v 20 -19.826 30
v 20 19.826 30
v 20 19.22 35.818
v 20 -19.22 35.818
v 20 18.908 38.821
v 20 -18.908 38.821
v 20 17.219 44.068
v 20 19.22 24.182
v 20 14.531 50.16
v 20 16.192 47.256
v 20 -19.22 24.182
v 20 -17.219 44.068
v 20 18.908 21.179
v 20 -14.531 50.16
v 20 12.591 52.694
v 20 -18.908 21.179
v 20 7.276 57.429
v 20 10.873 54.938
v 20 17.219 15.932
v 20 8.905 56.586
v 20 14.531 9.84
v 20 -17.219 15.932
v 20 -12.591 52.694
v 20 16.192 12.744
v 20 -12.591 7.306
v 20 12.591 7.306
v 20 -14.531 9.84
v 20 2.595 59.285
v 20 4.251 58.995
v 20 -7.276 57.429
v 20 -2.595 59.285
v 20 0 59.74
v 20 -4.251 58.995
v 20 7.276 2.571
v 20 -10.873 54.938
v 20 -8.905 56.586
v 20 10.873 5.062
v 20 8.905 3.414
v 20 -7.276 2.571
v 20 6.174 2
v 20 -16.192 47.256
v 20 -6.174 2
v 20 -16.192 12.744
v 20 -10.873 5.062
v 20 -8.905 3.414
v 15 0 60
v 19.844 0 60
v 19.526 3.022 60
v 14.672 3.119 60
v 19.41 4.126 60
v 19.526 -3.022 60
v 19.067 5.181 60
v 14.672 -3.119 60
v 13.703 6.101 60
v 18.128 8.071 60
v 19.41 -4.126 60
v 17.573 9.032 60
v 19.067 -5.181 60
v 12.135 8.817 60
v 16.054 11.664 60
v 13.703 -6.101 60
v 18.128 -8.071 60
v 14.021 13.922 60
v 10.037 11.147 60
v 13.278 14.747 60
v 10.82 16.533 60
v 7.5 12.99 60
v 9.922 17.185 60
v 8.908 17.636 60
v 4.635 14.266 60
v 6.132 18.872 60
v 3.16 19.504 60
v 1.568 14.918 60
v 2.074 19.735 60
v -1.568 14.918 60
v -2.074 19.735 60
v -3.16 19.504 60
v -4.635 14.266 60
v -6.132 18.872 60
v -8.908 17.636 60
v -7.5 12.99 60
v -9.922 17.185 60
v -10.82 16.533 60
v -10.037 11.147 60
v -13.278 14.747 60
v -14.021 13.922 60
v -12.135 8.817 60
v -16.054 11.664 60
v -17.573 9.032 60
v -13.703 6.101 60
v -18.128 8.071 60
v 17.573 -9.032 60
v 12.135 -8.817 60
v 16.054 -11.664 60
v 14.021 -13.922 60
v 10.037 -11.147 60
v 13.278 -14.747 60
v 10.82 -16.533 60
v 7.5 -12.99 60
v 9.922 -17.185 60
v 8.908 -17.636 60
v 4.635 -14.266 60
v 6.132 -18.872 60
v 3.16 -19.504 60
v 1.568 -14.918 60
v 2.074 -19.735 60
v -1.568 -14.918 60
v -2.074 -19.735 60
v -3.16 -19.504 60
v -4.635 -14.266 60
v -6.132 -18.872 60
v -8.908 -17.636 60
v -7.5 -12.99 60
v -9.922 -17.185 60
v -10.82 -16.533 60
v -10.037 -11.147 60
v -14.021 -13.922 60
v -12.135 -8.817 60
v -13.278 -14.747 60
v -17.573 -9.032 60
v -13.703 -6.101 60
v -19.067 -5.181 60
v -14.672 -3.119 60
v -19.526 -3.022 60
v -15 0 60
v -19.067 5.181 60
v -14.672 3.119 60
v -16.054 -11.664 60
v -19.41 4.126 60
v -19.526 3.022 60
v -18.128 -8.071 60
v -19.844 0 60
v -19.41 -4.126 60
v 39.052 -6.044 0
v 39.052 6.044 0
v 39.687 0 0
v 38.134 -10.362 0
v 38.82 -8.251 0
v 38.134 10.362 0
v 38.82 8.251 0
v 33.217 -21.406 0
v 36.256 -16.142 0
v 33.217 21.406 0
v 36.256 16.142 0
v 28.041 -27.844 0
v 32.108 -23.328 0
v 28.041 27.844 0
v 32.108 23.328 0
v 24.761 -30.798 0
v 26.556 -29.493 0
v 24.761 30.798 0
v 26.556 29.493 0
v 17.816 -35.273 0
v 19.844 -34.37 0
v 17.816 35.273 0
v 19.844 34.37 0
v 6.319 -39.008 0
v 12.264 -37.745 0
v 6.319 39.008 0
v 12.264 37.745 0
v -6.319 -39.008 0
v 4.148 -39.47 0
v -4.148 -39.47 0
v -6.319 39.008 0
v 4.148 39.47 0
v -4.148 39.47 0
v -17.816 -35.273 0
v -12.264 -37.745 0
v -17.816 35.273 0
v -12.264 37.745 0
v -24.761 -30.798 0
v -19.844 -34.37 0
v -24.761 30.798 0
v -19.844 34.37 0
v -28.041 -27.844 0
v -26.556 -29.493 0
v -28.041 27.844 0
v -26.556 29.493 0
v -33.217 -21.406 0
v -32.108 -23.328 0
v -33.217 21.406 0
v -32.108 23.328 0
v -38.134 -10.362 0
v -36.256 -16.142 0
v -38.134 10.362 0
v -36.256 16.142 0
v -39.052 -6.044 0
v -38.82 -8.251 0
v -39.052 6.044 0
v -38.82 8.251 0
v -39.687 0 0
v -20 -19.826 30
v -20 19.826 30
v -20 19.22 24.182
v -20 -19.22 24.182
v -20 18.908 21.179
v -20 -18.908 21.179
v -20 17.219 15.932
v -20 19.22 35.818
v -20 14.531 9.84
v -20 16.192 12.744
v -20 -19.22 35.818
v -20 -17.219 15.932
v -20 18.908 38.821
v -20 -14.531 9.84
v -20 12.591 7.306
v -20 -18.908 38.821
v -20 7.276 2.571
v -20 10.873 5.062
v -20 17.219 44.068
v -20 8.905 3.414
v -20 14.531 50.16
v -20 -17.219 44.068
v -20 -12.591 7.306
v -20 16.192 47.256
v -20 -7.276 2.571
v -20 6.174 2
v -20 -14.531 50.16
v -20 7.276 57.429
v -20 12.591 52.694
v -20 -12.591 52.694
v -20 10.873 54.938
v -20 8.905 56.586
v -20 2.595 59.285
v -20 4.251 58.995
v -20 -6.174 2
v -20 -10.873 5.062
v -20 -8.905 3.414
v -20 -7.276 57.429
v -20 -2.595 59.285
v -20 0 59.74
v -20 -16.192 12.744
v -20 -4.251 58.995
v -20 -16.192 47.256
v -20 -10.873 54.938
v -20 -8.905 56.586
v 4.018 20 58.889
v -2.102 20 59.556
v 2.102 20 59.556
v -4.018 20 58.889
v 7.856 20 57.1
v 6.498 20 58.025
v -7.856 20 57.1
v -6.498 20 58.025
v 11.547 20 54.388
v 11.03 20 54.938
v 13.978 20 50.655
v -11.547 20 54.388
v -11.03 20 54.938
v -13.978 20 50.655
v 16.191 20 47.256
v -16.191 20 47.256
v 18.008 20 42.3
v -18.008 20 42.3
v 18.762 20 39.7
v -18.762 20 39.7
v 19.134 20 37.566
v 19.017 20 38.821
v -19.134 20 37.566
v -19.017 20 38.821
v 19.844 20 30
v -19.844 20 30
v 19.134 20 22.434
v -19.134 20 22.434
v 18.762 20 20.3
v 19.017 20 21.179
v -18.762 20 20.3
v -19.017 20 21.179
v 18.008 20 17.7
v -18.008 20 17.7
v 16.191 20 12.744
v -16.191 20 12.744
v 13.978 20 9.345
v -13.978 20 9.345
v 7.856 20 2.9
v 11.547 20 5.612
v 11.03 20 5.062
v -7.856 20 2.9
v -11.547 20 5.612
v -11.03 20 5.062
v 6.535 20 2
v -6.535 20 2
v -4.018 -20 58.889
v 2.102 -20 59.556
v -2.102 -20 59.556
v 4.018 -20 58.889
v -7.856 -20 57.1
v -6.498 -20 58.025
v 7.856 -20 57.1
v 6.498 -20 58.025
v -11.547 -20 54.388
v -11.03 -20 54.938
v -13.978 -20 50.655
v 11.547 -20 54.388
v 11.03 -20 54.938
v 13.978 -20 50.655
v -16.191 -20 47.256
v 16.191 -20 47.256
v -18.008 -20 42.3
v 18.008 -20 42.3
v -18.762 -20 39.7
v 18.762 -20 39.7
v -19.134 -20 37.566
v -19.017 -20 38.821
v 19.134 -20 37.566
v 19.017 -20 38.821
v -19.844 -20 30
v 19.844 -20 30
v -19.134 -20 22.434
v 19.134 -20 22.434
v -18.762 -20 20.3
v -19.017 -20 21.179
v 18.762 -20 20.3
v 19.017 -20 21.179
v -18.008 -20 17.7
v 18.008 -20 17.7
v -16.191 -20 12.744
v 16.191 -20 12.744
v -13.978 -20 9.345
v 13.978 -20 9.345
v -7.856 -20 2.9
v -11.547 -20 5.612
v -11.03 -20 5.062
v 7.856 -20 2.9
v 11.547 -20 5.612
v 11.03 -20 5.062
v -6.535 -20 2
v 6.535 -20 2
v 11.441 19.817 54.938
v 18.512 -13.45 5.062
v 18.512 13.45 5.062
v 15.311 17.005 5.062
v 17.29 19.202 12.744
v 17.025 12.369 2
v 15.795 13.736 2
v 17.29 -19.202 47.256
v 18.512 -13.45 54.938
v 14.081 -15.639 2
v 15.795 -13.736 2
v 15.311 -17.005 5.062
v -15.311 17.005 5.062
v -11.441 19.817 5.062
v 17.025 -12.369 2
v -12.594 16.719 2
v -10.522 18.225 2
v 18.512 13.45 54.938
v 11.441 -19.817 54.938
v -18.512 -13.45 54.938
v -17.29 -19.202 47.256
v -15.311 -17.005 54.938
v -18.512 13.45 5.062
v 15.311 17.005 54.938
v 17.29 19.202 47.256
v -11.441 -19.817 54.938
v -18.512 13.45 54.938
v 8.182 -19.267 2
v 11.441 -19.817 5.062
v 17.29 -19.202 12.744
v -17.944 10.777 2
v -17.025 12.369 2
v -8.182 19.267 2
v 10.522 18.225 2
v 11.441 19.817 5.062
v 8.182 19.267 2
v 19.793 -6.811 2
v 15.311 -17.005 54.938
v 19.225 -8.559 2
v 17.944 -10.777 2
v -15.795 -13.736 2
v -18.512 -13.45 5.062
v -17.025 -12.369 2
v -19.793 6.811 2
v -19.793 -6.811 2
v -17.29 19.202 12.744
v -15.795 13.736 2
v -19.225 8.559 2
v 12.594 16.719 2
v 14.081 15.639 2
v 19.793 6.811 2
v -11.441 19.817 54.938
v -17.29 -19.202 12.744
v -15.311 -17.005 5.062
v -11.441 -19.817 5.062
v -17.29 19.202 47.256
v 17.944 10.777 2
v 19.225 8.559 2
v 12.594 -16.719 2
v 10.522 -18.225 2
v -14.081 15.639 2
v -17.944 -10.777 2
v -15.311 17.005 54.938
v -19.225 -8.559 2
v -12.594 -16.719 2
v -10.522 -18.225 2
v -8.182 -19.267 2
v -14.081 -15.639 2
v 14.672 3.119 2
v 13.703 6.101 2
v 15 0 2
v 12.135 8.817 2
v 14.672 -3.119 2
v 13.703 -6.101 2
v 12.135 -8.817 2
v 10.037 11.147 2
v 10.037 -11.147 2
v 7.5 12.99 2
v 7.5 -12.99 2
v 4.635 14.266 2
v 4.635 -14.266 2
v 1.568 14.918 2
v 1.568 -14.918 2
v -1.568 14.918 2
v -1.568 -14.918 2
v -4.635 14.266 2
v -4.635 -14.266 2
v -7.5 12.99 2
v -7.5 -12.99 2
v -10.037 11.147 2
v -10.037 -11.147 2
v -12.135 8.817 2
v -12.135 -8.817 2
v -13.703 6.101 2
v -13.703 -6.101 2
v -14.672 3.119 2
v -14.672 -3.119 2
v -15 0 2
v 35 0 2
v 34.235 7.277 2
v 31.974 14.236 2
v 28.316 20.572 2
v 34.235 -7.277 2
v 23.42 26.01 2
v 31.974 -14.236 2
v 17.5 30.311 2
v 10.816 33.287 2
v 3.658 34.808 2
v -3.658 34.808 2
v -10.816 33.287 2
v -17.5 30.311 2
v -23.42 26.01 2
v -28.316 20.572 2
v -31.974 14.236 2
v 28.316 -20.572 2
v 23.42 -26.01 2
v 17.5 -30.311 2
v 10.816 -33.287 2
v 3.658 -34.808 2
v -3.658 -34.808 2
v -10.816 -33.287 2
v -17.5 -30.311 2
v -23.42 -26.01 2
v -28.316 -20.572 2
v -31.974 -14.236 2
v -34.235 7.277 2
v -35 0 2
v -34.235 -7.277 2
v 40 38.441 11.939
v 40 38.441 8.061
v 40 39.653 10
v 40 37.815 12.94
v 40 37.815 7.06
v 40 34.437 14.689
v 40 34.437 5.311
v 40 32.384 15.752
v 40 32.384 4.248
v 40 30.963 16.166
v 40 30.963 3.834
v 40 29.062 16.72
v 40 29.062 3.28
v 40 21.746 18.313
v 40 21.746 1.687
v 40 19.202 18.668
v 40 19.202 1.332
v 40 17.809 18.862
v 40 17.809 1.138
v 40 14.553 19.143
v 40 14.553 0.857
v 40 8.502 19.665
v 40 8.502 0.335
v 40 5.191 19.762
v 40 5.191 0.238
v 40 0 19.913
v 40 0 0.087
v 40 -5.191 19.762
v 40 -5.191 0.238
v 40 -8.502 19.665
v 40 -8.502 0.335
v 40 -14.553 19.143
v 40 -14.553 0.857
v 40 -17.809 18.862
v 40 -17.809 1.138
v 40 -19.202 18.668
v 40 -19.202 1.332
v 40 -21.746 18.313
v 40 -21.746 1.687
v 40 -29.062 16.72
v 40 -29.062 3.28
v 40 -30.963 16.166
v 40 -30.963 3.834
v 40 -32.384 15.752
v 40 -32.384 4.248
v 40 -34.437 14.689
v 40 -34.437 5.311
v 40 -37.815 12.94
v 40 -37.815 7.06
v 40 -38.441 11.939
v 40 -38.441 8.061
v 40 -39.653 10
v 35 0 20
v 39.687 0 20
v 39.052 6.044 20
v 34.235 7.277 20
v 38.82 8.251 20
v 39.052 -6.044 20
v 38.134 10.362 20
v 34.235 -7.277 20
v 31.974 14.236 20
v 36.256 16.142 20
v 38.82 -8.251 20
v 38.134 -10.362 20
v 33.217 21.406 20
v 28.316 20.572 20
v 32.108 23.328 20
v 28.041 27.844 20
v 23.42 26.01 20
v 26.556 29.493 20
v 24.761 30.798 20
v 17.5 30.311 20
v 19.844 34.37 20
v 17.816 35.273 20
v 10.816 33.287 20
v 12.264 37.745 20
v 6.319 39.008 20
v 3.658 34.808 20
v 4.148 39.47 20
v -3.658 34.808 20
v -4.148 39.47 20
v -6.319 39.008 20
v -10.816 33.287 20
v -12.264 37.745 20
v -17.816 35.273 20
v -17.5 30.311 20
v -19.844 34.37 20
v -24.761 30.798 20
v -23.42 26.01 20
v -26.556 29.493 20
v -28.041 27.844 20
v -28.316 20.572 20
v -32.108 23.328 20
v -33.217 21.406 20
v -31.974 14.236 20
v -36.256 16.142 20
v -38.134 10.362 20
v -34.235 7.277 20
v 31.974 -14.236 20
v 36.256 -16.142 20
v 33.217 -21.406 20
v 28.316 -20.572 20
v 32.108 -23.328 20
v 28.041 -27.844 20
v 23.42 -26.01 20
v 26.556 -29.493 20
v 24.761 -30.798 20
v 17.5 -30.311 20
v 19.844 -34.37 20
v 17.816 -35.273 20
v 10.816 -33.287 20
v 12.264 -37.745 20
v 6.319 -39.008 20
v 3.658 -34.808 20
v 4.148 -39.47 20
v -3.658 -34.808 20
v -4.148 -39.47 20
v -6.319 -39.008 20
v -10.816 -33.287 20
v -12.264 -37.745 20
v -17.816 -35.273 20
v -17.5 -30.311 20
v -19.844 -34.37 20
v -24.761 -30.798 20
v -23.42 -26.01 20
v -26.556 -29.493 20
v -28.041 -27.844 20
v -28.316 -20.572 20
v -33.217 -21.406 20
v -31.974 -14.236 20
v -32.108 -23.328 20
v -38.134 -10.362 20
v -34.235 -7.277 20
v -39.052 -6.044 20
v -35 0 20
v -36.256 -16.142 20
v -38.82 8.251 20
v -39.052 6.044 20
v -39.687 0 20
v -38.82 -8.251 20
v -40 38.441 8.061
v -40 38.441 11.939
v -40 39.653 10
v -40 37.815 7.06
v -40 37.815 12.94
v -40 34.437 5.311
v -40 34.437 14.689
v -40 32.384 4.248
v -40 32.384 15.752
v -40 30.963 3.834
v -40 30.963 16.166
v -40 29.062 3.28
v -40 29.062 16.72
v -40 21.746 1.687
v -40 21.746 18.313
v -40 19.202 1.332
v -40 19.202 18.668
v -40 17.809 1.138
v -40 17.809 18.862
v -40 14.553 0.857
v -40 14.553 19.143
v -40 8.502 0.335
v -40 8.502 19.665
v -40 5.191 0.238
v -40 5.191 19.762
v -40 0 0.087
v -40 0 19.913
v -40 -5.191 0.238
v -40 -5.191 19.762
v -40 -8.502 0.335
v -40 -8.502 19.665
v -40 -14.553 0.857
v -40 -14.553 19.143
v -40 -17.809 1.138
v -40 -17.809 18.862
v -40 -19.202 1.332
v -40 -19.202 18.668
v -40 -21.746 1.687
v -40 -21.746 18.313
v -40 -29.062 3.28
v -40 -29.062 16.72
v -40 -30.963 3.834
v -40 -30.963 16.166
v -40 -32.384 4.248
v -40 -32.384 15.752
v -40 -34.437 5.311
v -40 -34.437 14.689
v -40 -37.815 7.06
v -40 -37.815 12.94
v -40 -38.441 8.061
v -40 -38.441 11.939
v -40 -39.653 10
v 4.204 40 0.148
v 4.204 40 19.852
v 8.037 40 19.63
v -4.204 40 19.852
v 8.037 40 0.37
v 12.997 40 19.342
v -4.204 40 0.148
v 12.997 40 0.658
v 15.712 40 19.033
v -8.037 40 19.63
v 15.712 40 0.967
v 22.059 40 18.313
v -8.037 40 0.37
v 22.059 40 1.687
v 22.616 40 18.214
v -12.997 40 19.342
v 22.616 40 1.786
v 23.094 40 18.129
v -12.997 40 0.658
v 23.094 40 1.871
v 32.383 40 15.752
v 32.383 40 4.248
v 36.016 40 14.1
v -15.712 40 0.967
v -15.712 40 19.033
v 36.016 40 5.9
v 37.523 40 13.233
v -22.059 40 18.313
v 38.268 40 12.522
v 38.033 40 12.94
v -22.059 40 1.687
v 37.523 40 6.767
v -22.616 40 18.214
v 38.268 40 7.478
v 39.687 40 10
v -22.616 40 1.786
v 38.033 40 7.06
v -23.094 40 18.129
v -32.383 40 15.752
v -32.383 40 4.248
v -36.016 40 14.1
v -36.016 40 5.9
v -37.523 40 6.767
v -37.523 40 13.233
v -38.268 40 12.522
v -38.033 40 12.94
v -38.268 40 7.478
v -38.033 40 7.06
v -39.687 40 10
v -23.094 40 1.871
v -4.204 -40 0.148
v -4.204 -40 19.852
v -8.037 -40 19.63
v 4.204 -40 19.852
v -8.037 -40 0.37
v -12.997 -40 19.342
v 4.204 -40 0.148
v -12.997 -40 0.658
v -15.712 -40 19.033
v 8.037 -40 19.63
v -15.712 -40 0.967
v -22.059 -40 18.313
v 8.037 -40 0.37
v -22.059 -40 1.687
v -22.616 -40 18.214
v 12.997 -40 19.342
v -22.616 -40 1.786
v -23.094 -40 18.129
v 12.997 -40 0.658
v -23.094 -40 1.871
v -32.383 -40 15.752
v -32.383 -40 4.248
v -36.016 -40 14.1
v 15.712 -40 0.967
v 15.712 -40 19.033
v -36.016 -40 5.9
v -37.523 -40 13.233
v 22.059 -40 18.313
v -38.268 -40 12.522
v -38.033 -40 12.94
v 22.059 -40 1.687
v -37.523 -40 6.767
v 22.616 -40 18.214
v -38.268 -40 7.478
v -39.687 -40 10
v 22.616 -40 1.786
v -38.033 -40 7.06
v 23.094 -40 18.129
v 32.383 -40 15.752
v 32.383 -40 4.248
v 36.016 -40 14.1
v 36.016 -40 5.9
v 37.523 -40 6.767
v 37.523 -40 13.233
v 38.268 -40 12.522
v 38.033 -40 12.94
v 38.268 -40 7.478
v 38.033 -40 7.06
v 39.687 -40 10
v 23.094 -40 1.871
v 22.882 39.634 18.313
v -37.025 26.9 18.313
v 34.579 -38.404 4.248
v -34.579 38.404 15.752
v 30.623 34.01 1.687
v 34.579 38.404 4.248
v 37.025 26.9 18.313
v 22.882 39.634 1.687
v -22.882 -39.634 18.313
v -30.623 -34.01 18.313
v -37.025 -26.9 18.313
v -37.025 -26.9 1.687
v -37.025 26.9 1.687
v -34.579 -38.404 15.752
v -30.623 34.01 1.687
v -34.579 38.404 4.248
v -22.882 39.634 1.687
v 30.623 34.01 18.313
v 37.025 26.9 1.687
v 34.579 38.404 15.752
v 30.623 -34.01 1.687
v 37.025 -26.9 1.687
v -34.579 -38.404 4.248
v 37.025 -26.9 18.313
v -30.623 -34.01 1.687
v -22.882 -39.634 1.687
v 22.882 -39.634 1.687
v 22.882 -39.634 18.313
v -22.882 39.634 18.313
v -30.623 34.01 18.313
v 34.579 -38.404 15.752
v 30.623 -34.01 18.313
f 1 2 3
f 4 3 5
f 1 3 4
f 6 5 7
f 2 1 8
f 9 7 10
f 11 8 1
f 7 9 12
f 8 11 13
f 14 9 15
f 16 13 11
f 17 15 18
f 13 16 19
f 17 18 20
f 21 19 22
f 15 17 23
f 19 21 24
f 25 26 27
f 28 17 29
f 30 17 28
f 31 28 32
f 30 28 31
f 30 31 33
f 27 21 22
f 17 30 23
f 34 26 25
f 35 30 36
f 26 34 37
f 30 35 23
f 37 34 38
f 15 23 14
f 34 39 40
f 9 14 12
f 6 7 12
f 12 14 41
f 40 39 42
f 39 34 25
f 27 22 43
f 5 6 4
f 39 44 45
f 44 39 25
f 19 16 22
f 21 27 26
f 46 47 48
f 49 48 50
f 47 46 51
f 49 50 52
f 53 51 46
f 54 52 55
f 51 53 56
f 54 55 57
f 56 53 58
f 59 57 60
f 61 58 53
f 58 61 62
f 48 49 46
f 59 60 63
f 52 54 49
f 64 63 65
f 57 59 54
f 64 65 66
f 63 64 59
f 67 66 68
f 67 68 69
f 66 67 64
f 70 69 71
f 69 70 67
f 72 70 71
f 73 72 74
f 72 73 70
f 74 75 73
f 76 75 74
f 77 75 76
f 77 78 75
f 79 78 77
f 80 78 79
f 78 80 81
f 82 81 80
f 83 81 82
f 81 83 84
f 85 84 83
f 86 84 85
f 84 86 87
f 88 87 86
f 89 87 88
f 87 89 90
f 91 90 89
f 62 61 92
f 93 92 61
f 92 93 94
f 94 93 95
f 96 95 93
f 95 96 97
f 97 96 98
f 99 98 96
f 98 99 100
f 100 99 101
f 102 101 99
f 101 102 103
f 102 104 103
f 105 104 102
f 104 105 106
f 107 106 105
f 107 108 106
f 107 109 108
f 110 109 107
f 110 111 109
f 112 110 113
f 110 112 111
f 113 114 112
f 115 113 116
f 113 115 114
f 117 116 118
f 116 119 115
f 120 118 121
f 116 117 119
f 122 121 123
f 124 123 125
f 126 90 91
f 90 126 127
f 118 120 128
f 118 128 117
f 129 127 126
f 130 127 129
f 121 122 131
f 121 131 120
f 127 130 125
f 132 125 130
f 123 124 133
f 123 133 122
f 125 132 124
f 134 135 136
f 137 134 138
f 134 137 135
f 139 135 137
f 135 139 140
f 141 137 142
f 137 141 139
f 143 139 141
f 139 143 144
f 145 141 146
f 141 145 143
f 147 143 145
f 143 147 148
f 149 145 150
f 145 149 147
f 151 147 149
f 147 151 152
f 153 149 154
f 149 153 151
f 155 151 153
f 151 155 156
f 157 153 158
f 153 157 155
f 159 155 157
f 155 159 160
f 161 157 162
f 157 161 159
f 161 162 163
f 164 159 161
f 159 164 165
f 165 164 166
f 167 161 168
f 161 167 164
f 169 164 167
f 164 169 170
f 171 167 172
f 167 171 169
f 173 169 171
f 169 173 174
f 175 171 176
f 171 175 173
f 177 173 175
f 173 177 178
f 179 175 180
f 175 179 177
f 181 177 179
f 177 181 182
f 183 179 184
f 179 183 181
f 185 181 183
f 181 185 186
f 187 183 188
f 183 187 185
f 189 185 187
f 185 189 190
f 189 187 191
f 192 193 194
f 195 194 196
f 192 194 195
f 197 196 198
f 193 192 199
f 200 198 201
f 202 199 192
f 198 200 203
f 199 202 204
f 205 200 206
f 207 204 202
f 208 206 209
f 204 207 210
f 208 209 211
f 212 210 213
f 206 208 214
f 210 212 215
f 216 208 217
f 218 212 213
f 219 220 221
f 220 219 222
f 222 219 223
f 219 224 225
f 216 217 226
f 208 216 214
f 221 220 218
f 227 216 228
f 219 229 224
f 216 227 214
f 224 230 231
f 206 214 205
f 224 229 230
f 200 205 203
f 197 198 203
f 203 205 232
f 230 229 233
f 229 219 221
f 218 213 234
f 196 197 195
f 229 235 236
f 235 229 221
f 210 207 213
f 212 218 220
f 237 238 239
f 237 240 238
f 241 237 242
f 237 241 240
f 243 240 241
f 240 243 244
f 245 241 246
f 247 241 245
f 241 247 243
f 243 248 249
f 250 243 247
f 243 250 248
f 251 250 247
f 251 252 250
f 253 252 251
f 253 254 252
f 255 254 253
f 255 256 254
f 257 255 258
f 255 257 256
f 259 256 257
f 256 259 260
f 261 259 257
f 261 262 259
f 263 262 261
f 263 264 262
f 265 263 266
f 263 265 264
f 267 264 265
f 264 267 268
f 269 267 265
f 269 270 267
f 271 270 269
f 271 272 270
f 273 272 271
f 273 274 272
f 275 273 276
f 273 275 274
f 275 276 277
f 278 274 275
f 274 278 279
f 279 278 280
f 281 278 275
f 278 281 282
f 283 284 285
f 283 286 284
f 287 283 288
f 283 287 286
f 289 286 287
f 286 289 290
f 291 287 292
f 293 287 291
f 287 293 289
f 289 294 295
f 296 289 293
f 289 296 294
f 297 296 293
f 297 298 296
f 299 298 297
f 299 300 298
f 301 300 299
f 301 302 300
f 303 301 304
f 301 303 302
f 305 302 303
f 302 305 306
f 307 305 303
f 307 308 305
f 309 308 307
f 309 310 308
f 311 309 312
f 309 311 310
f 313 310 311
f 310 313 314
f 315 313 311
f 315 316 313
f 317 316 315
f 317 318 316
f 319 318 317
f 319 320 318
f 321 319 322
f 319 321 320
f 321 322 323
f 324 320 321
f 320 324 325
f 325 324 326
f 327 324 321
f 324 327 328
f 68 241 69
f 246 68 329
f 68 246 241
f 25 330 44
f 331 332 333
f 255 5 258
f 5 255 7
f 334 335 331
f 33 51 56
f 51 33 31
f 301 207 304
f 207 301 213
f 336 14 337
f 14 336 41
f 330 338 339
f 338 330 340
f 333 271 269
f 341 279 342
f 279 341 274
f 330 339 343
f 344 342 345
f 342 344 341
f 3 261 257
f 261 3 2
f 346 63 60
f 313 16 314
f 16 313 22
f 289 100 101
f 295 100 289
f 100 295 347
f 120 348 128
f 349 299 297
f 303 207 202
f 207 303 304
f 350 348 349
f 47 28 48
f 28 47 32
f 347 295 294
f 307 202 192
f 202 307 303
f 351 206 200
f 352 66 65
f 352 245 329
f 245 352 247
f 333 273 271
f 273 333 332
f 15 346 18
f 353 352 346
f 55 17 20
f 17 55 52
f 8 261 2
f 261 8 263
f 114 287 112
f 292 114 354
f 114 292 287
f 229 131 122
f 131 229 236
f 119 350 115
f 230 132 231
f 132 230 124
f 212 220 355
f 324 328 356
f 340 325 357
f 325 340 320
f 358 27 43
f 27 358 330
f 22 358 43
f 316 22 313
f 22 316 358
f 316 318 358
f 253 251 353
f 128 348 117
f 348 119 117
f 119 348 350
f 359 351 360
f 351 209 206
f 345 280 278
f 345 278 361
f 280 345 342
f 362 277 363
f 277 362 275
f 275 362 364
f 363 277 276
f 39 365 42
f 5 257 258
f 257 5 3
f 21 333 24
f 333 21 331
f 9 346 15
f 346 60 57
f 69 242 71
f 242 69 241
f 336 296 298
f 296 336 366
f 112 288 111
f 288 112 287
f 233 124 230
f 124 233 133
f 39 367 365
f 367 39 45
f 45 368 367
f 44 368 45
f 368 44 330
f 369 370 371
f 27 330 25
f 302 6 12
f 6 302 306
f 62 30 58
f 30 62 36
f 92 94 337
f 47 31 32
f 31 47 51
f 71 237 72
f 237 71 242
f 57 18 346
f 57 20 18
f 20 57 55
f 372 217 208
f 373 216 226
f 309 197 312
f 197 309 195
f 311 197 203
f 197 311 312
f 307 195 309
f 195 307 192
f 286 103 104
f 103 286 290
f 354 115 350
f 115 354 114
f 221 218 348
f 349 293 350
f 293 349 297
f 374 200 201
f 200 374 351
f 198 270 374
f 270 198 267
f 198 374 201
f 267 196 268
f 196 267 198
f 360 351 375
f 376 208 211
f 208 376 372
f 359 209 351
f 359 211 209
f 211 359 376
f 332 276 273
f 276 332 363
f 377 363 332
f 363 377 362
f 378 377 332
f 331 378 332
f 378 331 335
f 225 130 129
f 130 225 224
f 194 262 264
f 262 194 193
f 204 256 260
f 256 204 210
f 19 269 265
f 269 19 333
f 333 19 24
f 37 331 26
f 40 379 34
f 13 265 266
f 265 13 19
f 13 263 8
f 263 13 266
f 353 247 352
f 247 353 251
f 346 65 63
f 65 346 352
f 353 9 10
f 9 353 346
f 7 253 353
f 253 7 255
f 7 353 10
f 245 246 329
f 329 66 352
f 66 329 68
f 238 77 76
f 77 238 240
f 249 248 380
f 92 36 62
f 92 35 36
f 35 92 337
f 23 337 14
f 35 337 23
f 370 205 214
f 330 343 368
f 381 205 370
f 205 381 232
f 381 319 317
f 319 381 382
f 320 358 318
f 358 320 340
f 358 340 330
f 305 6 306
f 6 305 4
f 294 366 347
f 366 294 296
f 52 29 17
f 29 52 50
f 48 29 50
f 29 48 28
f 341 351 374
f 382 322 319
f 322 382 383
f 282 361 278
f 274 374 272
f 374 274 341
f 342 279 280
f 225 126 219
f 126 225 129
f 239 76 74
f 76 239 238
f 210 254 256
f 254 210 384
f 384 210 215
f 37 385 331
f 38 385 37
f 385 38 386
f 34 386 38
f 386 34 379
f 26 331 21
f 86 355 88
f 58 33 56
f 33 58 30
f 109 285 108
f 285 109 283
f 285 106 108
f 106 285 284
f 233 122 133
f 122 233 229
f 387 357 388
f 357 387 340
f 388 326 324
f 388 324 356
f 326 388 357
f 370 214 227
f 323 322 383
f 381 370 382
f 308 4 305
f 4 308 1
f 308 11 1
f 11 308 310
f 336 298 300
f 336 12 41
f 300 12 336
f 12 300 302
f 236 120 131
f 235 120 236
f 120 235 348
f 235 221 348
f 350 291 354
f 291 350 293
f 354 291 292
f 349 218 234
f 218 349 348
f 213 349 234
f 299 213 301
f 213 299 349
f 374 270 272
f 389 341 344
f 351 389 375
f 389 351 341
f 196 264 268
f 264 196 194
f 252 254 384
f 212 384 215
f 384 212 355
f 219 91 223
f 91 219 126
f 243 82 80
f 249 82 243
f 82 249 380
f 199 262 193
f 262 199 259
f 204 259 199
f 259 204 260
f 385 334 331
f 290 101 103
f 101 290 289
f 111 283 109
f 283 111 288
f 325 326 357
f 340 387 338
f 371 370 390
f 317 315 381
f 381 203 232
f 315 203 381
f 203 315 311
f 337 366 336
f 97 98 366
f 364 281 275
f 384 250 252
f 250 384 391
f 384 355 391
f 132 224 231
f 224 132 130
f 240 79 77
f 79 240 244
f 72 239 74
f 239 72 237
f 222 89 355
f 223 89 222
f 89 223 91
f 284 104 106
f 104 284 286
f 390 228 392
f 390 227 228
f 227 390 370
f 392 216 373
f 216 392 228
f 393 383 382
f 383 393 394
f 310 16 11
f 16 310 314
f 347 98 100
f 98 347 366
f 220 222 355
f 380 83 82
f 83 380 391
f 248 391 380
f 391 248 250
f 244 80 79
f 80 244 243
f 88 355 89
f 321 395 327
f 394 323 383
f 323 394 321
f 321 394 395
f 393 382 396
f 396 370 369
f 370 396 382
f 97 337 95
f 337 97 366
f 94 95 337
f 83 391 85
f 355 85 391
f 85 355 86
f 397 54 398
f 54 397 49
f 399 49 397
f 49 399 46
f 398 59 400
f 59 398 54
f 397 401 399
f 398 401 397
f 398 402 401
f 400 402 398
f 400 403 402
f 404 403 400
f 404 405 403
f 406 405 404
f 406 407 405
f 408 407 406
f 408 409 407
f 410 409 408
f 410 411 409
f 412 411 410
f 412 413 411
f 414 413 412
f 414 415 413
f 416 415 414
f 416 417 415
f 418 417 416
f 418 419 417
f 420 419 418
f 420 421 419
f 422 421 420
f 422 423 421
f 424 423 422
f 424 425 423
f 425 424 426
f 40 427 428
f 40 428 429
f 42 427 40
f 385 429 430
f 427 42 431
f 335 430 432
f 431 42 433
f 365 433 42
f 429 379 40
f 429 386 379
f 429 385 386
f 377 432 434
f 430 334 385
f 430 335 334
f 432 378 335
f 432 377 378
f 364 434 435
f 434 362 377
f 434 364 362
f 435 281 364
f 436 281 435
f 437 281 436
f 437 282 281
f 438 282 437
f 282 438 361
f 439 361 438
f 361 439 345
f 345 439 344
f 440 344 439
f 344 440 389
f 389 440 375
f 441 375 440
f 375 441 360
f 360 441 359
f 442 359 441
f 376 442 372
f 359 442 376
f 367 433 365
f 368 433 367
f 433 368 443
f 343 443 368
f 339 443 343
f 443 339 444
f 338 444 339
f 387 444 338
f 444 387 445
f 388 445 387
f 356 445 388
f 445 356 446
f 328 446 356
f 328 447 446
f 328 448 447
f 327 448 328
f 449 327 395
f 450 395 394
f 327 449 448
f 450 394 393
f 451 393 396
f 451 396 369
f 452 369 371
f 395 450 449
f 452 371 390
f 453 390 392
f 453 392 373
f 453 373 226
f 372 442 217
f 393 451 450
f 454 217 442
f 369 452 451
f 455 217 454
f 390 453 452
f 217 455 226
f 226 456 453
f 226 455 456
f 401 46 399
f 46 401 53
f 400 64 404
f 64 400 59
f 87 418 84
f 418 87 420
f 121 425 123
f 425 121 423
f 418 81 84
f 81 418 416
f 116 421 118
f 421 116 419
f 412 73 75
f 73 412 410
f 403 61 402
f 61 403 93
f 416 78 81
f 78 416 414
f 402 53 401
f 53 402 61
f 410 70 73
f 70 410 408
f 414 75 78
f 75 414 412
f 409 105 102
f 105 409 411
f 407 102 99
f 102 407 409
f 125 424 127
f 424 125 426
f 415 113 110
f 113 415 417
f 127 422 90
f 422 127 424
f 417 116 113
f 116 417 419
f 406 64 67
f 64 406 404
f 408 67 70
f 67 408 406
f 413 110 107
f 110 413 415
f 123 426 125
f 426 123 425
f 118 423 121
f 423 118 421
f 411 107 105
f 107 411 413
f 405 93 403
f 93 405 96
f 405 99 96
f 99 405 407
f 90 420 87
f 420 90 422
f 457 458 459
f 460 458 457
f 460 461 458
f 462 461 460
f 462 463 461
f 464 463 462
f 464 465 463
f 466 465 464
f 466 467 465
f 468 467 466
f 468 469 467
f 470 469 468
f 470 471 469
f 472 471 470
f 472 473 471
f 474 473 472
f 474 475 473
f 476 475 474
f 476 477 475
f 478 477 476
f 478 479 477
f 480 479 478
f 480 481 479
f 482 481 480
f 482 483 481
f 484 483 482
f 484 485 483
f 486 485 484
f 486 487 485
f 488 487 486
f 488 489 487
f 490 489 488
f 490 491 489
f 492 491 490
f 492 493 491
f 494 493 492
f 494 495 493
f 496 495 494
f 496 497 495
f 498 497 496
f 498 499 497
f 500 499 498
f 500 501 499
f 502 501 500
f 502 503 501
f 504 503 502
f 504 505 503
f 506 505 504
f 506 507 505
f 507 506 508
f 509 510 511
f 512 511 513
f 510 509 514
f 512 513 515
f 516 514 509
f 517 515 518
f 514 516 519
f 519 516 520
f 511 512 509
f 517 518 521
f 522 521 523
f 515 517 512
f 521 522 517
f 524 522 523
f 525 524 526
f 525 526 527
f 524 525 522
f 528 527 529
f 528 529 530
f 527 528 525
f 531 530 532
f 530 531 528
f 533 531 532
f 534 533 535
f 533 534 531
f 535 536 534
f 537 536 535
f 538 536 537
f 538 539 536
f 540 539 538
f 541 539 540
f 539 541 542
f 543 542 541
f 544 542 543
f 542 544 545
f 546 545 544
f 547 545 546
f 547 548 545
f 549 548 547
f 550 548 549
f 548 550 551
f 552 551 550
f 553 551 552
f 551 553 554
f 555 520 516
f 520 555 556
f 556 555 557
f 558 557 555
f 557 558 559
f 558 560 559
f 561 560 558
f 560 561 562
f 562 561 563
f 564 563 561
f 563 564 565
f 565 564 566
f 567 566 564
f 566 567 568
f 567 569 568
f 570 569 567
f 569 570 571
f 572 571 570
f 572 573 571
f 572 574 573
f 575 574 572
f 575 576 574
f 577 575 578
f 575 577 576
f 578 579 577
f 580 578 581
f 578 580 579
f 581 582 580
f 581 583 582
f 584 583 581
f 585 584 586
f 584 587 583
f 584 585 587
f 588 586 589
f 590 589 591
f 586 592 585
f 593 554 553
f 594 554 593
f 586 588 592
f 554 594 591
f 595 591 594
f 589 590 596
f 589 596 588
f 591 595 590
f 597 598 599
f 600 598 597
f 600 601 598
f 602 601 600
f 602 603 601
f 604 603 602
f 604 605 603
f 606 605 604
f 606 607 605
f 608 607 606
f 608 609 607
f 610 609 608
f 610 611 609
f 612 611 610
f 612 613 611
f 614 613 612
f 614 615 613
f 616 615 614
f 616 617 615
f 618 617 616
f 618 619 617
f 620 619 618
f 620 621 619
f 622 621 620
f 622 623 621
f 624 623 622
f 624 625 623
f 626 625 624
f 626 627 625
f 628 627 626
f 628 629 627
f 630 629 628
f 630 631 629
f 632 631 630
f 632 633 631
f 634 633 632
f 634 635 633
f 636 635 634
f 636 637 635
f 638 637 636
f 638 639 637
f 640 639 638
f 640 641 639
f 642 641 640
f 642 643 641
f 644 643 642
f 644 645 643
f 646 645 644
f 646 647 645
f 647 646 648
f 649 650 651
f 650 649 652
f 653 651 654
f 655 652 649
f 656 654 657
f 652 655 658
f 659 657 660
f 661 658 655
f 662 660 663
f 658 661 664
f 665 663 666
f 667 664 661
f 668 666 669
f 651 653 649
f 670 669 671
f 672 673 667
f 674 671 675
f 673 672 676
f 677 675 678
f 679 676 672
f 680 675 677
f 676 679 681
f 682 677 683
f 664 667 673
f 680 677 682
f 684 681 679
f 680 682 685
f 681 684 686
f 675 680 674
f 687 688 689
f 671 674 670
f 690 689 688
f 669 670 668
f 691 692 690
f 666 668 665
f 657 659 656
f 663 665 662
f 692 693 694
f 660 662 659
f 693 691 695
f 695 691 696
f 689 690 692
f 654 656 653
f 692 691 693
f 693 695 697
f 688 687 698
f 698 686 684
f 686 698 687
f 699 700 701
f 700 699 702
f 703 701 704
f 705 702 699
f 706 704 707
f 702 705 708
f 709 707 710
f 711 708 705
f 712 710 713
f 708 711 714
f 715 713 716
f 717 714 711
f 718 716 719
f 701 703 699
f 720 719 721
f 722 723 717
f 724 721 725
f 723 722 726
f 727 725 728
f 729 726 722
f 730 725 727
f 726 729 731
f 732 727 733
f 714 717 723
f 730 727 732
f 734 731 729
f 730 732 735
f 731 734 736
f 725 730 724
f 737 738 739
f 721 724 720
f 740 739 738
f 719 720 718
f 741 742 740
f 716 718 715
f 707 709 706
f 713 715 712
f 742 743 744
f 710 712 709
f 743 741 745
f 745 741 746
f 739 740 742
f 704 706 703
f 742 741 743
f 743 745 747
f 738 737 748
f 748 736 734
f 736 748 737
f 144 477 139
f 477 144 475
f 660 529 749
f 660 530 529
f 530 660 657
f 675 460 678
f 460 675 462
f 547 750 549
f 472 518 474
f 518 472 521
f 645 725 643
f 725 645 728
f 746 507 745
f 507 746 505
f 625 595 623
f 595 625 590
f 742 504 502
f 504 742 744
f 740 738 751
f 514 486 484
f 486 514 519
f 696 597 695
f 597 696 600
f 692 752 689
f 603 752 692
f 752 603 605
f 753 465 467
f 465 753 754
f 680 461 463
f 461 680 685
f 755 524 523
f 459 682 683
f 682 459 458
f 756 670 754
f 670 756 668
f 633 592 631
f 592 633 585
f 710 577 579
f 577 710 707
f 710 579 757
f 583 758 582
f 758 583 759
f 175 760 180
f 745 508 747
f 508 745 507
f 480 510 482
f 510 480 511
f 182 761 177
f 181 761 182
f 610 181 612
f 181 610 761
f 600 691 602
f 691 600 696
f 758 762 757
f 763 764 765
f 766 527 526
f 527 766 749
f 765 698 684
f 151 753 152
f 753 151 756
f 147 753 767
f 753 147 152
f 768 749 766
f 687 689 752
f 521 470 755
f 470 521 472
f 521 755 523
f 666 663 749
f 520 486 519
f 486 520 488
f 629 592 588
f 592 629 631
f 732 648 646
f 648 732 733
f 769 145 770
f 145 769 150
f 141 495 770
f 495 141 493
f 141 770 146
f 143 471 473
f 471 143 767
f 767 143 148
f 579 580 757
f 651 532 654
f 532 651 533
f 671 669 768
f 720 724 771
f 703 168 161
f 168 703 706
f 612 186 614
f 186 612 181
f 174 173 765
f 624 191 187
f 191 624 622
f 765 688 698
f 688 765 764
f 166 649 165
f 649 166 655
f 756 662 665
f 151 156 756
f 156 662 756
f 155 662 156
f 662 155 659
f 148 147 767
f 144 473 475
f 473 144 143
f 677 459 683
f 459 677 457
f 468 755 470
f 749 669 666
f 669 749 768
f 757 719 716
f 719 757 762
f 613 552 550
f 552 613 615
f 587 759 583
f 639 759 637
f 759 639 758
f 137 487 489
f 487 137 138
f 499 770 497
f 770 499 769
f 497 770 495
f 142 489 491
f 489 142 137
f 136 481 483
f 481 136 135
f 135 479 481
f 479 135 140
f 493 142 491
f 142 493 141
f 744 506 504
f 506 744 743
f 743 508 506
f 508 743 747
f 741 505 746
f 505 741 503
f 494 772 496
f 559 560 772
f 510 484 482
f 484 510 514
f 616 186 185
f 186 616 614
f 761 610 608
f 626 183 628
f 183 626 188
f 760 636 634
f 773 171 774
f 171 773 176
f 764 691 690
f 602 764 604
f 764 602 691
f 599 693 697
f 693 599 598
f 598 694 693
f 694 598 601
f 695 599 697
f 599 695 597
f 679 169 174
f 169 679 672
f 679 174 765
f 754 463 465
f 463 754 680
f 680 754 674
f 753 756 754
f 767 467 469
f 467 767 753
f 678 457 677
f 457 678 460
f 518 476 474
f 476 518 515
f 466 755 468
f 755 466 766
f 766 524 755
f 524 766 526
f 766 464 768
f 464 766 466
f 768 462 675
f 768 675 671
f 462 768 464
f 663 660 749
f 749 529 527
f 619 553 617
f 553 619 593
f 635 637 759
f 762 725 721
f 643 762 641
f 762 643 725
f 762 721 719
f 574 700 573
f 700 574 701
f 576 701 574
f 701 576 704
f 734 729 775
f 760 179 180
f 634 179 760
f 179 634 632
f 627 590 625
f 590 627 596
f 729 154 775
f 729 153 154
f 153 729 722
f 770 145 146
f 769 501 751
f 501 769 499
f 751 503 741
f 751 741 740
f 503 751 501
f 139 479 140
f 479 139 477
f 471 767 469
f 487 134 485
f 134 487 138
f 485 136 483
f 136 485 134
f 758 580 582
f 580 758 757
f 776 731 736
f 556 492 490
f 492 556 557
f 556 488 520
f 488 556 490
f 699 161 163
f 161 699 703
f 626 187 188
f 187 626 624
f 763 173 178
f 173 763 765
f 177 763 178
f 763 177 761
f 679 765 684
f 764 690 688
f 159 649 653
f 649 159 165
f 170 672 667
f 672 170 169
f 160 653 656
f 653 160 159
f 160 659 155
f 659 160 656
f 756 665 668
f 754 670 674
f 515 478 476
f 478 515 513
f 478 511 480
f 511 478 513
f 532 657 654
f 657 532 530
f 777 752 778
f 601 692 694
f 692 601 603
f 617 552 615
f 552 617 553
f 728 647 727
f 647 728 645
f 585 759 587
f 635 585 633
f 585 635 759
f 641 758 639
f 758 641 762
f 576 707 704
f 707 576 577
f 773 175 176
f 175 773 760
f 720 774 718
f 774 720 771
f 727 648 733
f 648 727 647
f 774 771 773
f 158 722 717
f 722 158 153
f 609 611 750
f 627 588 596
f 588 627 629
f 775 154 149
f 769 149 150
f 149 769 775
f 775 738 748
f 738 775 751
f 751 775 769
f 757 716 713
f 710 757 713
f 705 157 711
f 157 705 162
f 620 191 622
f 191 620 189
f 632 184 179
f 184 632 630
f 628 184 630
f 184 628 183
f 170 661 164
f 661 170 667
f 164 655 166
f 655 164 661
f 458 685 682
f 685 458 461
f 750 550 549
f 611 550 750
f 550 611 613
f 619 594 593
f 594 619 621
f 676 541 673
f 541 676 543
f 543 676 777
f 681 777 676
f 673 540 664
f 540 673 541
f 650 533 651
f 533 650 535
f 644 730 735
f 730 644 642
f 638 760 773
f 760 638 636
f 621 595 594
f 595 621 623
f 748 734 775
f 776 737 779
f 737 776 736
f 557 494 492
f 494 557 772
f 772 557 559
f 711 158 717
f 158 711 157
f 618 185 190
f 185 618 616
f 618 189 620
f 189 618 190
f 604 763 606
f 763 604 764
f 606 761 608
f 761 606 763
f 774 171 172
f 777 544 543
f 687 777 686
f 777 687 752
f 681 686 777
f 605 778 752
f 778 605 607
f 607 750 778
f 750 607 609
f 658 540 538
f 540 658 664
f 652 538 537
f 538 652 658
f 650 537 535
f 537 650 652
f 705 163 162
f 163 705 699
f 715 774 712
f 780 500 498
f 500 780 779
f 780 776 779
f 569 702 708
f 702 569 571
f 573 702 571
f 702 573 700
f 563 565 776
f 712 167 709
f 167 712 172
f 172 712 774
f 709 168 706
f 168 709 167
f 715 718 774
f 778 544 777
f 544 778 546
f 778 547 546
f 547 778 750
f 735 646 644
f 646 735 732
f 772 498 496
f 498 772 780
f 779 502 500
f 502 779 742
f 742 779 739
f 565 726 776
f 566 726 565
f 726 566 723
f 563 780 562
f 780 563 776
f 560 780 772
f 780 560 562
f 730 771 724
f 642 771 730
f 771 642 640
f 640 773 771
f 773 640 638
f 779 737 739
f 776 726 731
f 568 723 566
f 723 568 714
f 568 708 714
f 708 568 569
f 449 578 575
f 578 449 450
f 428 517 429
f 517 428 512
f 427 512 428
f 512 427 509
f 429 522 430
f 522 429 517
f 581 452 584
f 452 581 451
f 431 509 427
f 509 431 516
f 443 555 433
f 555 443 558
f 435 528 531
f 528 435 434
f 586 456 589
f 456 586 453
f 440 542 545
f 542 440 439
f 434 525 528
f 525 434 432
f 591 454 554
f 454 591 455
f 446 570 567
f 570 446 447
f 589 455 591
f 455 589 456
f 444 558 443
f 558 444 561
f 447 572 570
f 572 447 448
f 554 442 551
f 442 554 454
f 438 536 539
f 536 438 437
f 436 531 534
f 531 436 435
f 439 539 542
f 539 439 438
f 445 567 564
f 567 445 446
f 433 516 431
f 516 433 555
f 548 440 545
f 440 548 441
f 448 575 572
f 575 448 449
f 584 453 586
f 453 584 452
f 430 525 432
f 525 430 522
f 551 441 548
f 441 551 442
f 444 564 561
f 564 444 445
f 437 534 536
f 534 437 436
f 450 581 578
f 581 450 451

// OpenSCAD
 module mug(width, height, bottom_thickness=2, wall_thickness=5)
  {
    translate([0,0,height/2])
      difference()
      {
        intersection()
        {
          cube([width,width,height], center=true);
          scale([1,1,height/width])
            sphere(width/2 * sqrt(2));
        }
        translate([0,0,-height/2+bottom_thickness])
          cylinder(r=width/2-wall_thickness,h=height+0.1);
      }
  }

   //Reference dimension can be taken from below..
  union()
  {
    mug(width=40, height=60); // top Flask
    mug(width=80, height=20); // bottom flask
  }
